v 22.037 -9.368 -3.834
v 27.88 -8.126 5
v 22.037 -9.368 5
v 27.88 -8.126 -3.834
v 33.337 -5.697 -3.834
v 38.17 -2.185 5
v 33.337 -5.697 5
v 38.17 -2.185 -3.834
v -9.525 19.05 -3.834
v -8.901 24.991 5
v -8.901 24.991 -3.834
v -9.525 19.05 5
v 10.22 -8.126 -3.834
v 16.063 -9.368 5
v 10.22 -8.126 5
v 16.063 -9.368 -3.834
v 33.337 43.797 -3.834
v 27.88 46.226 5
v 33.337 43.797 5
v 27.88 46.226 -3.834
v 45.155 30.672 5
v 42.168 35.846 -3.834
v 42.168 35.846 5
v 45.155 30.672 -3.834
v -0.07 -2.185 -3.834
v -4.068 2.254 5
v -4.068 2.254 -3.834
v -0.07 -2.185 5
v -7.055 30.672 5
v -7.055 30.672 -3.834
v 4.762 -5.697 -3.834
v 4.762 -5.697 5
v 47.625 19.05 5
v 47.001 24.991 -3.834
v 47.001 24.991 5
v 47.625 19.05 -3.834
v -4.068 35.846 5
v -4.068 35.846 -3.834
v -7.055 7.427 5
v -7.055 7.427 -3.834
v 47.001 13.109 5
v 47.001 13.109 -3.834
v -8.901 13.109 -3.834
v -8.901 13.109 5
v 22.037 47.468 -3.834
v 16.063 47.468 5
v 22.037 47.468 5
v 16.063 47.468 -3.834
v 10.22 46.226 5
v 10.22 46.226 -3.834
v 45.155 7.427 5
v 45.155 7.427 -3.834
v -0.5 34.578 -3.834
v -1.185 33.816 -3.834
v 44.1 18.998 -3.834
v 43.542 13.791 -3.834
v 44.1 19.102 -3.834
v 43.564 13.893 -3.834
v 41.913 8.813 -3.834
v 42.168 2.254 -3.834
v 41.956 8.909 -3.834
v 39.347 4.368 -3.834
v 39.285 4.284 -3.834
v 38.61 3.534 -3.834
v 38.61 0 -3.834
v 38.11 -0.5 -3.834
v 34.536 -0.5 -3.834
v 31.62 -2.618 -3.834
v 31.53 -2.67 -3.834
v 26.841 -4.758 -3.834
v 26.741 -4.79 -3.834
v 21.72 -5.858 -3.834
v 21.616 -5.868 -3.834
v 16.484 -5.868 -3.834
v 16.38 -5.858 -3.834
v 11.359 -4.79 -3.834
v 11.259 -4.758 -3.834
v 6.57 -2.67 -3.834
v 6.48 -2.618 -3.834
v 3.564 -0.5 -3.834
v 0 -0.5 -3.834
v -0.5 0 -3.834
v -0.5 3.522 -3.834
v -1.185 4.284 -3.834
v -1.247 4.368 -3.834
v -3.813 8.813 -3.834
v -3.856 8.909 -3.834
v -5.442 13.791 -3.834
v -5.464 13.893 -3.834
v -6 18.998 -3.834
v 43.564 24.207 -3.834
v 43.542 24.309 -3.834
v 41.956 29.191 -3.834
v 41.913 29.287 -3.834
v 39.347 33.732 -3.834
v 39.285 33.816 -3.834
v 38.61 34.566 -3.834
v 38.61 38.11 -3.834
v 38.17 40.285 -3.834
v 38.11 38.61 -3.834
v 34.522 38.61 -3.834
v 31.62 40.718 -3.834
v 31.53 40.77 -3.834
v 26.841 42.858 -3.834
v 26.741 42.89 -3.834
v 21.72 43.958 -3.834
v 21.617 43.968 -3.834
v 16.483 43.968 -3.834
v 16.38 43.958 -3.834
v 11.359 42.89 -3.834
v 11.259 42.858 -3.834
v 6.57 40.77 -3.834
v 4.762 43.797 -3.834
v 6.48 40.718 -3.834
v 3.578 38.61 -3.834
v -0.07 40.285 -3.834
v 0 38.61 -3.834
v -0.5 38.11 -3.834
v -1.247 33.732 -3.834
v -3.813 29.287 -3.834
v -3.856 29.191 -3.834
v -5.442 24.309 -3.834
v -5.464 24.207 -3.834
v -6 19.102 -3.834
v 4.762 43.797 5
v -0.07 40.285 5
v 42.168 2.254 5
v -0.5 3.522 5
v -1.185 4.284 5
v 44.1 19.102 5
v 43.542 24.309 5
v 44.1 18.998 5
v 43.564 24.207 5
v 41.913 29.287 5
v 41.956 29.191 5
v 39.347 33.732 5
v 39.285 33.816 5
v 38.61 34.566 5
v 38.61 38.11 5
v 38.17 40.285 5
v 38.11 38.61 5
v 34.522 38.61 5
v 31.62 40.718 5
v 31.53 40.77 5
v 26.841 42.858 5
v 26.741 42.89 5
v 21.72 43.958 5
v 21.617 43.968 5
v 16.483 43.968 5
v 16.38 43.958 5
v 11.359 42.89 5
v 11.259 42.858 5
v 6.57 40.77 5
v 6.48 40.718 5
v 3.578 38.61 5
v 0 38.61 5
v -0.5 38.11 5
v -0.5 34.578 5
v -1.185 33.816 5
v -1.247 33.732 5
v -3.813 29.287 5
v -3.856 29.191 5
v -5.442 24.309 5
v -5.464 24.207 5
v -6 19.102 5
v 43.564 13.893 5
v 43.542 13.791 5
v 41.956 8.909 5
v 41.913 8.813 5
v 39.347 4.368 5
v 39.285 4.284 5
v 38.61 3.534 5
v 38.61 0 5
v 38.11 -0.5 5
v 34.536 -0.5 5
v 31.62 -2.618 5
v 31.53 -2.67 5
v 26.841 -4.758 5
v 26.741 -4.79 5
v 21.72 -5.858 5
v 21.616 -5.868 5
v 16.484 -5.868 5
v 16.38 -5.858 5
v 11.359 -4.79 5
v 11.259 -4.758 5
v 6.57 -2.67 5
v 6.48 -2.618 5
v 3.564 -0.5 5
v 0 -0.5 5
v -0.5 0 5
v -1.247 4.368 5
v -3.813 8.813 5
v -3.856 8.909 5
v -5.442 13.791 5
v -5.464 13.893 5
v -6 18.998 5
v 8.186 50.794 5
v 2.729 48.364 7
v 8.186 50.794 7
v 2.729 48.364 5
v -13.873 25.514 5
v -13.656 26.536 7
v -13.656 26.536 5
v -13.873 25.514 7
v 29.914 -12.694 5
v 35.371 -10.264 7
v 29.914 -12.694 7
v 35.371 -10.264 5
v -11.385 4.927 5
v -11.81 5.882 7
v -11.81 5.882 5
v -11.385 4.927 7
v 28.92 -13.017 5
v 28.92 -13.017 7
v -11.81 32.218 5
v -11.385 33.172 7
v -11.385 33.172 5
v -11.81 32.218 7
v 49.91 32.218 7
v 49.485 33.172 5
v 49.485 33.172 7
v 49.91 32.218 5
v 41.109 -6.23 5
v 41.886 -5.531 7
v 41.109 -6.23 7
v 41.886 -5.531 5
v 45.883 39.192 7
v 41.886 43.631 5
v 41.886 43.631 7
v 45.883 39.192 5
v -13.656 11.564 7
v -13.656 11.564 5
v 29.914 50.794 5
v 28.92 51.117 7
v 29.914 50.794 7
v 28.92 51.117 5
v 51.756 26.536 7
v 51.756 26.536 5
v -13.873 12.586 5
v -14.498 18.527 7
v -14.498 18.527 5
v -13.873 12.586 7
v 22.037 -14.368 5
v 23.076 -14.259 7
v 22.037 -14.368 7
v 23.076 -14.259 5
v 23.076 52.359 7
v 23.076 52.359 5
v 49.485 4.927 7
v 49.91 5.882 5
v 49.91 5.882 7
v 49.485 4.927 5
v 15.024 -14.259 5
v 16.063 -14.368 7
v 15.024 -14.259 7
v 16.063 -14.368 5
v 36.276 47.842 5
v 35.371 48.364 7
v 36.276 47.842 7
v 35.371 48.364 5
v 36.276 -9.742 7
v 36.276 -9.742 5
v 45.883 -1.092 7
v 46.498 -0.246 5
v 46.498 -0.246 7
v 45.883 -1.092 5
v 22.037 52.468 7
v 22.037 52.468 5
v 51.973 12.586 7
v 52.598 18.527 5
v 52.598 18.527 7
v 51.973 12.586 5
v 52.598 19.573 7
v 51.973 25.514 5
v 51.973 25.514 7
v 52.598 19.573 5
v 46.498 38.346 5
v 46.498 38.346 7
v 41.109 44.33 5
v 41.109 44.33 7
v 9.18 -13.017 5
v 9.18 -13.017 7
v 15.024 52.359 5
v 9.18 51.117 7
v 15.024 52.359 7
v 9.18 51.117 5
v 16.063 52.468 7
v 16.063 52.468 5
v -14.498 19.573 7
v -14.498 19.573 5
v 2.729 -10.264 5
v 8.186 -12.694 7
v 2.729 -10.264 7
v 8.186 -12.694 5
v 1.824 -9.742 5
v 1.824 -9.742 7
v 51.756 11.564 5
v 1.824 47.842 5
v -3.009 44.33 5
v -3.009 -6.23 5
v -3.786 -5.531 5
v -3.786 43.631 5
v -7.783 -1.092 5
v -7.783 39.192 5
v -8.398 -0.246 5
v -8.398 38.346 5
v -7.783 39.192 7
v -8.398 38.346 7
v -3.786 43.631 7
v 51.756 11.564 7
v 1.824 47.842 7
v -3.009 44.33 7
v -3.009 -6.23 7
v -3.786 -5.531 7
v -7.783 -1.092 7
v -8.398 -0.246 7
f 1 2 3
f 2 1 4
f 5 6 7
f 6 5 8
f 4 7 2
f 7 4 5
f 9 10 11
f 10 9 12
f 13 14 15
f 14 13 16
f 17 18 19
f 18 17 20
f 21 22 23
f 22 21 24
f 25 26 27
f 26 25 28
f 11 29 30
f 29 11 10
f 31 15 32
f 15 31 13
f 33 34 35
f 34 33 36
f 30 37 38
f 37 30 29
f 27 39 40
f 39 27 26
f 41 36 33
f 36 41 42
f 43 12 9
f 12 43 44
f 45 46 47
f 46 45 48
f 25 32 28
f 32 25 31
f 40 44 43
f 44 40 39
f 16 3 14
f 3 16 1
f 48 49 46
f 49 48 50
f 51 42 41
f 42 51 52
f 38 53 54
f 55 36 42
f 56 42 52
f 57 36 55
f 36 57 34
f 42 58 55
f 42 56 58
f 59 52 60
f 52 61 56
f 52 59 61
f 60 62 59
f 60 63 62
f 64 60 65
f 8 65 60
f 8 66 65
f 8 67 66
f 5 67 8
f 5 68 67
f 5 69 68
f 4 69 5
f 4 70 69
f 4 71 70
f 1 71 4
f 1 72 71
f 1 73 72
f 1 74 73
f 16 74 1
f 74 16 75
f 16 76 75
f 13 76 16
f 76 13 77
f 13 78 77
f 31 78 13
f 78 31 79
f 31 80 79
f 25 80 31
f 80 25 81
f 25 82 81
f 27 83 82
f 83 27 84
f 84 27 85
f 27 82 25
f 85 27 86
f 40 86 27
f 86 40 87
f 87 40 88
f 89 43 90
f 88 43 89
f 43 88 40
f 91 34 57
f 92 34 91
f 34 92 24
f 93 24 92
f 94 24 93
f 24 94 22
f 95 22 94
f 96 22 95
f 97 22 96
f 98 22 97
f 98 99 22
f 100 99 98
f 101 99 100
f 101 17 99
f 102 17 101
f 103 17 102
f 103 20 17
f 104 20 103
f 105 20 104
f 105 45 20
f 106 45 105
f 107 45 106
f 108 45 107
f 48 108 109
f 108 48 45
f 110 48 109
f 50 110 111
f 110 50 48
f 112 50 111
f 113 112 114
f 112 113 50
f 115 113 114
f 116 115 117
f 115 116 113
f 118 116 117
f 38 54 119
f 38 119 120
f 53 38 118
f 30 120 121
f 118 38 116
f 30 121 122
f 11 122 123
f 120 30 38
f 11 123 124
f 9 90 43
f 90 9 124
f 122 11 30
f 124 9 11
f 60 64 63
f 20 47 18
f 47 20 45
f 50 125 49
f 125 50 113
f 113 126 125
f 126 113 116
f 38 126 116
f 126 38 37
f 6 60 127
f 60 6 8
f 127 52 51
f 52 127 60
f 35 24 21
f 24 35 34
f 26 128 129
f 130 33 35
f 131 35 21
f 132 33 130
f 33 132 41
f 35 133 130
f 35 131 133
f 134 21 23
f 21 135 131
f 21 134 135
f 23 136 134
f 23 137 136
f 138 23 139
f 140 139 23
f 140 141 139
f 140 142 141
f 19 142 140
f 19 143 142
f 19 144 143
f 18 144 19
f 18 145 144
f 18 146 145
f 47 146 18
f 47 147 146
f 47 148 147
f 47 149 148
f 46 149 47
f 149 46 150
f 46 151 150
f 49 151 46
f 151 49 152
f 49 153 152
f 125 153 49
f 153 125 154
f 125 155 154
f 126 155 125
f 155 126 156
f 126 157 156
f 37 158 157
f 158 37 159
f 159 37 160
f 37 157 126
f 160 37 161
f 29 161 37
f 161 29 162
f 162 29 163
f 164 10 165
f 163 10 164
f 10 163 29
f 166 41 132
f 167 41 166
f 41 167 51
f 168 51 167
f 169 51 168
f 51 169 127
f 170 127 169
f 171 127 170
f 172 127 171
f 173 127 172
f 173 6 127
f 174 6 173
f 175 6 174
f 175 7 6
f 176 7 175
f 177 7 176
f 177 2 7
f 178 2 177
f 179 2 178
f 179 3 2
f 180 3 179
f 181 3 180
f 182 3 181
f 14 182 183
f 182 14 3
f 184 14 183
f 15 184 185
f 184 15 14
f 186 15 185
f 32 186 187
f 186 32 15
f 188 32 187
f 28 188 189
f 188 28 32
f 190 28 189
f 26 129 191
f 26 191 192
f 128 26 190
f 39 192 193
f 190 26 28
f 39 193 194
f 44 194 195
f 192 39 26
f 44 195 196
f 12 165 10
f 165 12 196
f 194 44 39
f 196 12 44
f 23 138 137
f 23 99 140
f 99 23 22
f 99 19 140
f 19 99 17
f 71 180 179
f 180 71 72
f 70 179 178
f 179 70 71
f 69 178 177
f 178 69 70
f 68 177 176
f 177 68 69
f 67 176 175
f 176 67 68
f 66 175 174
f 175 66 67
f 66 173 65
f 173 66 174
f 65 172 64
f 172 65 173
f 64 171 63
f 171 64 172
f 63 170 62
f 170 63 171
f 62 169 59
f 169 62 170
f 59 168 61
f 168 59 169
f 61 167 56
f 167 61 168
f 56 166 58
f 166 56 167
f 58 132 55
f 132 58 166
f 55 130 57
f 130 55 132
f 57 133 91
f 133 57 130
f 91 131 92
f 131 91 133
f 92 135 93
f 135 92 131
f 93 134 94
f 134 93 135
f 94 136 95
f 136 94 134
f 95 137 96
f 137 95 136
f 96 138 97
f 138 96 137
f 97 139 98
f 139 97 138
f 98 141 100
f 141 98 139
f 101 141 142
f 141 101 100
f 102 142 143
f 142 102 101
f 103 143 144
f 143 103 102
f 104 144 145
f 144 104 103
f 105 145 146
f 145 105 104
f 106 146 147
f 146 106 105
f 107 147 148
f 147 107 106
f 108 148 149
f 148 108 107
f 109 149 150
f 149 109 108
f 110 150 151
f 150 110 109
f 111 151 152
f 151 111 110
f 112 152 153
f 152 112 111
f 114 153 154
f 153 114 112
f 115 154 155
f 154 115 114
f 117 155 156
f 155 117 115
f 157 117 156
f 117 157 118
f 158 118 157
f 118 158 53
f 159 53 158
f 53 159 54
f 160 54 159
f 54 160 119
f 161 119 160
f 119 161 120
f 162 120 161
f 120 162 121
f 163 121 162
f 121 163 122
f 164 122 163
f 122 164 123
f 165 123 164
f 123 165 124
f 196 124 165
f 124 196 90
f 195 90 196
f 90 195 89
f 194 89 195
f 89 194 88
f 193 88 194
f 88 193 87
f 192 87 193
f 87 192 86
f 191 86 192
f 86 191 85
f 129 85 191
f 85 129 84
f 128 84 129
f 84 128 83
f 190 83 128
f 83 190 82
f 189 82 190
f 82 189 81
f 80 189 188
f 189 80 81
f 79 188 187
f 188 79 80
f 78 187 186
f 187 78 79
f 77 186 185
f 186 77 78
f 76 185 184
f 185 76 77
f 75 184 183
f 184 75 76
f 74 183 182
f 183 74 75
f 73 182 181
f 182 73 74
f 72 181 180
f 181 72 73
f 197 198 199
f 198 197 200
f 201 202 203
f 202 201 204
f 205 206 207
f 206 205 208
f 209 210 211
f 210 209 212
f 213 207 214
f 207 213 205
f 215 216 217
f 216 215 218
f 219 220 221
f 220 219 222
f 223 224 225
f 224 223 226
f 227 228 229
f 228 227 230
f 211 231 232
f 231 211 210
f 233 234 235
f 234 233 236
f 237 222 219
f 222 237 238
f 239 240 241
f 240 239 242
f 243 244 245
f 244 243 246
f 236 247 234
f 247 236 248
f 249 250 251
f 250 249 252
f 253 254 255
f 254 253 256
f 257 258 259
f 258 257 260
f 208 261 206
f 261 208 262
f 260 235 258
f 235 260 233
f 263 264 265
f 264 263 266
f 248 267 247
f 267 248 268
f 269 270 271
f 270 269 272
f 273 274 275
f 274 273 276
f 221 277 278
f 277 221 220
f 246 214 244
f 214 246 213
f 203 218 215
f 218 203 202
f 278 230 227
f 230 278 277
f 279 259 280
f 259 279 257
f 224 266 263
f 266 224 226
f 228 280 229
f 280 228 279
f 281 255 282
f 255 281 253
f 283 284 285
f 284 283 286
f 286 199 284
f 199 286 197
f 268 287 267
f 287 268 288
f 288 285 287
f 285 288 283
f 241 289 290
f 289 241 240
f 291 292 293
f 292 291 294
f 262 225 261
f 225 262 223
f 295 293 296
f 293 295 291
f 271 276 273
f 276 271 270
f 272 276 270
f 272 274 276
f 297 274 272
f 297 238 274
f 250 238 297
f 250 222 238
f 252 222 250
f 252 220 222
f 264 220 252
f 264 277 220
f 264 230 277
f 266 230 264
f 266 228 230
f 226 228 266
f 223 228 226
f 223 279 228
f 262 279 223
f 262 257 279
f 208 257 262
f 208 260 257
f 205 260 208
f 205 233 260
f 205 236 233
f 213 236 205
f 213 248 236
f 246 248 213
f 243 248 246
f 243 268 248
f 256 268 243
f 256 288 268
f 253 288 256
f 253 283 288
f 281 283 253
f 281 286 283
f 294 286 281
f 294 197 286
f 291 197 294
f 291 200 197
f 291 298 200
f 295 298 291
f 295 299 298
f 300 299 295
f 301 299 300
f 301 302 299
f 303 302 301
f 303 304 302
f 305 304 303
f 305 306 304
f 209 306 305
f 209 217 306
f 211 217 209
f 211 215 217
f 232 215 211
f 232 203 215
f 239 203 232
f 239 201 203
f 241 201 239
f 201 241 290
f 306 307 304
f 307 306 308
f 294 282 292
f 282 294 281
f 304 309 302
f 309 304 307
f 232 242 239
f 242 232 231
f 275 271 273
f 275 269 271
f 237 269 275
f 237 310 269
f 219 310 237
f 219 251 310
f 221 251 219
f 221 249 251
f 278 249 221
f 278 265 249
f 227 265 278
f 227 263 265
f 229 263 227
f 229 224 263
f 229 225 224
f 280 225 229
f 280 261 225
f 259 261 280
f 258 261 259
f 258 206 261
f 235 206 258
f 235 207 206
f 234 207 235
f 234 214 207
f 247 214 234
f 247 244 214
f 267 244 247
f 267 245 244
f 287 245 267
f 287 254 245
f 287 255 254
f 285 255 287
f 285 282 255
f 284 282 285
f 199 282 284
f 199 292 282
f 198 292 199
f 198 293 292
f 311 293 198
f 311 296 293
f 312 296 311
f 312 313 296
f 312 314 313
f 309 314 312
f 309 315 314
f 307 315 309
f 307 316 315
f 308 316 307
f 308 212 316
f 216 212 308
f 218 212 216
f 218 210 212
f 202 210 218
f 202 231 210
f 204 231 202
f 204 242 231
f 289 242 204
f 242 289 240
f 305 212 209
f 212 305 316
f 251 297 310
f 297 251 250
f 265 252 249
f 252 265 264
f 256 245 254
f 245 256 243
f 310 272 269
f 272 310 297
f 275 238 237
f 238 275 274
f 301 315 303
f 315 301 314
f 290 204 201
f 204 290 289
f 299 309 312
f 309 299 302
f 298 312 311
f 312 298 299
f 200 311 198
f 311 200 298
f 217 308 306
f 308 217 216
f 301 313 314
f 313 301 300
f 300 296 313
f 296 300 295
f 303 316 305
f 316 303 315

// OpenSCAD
// file: ../../lib/circuits/helpers.scad
function bu(u) = u * 2.54;

module breadboard_row(number, orientation="vertical") {
  children();
  if(number > 1) {
    if(orientation == "vertical") {
      translate([0,bu(1),0])
        breadboard_row(number-1, orientation=orientation) {
          children();
        }
    } else {
      translate([bu(1),0,0])
        breadboard_row(number-1, orientation=orientation){
          children();
        }
    }
  }
}
// file: ../../lib/switches/rgb.scad
include <../variables.scad>

module rgb_row_trace_connection(width, height, xpos, ypos, rgb, connections) {
  half_width = u_mm(width)/2;
  half_height = u_mm(height)/2;
  if(connections[3] == "connect") {
    translate([1-half_width,8.875,0]){
      circle(d=0.8,$fn=40);
      offset(0.4)
        polygon(points=[[0,-0.01],[0,0.01],[u_mm(-xpos)-2, u_mm(-ypos)+0.01],[u_mm(-xpos)-2, u_mm(-ypos)-0.01]]);
    }
    translate([1-half_width,4.9,0]){
      circle(d=0.8,$fn=40);
      offset(0.4)
        polygon(points=[[0,-0.01],[0,0.01],[u_mm(-xpos)-2, u_mm(-ypos)+0.01],[u_mm(-xpos)-2, u_mm(-ypos)-0.01]]);
    }
    translate([1-half_width,3.3,0]){
      circle(d=0.8,$fn=40);
      offset(0.4)
        polygon(points=[[0,-0.01],[0,0.01],[u_mm(-xpos)-2, u_mm(-ypos)+0.01],[u_mm(-xpos)-2, u_mm(-ypos)-0.01]]);
    }
  }
  if(connections[2] == "connect") {
    translate([half_width-1,8.875,0]) {
      circle(d=0.8,$fn=40);
    }
    translate([half_width-1,4.9,0]) {
      circle(d=0.8,$fn=40);
    }
    translate([half_width-1,3.3,0]){
      circle(d=0.8,$fn=40);
    }
  }
}

module rgb_pcb_drill(width=1, height=1, rgb=true, connections=["hole","hole","hole","hole"]) {
  half_width = u_mm(width)/2;
  half_height = u_mm(height)/2;
  translate([half_width,half_height,0]) {
    if(rgb == true) {
      // LED Hole
      translate([-1.875,3.4])
        square([3.75,3]);

      // LED D
      if(connections[3] == "hole")
        translate([1.3-half_width,8,0])
          circle(d=1,$fn=40);
      if(connections[2] == "hole")
        translate([half_width-1.3,8,0])
          circle(d=1,$fn=40);

      // LED G
      if(connections[3] == "hole")
        translate([1.3-half_width,5.4,0])
          circle(d=1,$fn=40);
      if(connections[2] == "hole")
        translate([half_width-1.3,5.4,0])
          circle(d=1,$fn=40);

      // LED V
      if(connections[3] == "hole")
        translate([1.3-half_width,2.8,0])
          circle(d=1,$fn=40);
      if(connections[2] == "hole")
        translate([half_width-1.3,2.8,0])
          circle(d=1,$fn=40);
    }

    children();
  }
}

module rgb_pcb_hole_traces(width=1, height=1, rgb=true, xpos=0, ypos=0, connections=["hole","hole","hole","hole"]) {
  half_width = u_mm(width)/2;
  half_height = u_mm(height)/2;
  translate([half_width,half_height,0]) {
    if(rgb == true) {
      // LED D
      if(connections[3] == "hole")
        translate([1.3-half_width,8,0])
          circle(d=2.5,$fn=40);
      if(connections[2] == "hole")
        translate([half_width-1.3,8,0])
          circle(d=2.5,$fn=40);

      // LED G
      if(connections[3] == "hole")
        translate([1.3-half_width,5.4,0])
          circle(d=2.5,$fn=40);
      if(connections[2] == "hole")
        translate([half_width-1.3,5.4,0])
          circle(d=2.5,$fn=40);

      // LED V
      if(connections[3] == "hole")
        translate([1.3-half_width,2.8,0])
          circle(d=2.5,$fn=40);
      if(connections[2] == "hole")
        translate([half_width-1.3,2.8,0])
          circle(d=2.5,$fn=40);
    }

    children();
  }
}

module rgb_pcb_traces(width=1, height=1, rgb=true, xpos=0, ypos=0, connections=["hole","hole","hole","hole"]) {
  half_width = u_mm(width)/2;
  half_height = u_mm(height)/2;
  rgb_pcb_hole_traces(width=width, height=height, rgb=rgb, connections=connections) {
    if(rgb == true) {
      rgb_row_trace_connection(width=width, height=height, xpos=xpos, ypos=ypos, rgb=rgb, connections=connections);
      v_left = connections[3] == "none" ? 1 : half_width-5;
      // LED G
      translate([1.25,5])
        square([2,2]);
      translate([2.7,8.5,0]) {
        length = connections[2] == "none" ? 2 : half_width-3.7; 
        square([length,0.75]);
      }
      translate([2.7,6.8])
        square([0.8,2.4]);
      translate([-3.5,6.2])
        square([7,0.8]);
      translate([-3.5,6.8])
        square([0.8,2.4]);
      translate([-4-v_left,8.5,0])
        square([v_left+1,0.75]);

      // LED D
      translate([-4-v_left,4.5,0])
        square([v_left,0.8]);
      translate([-4.5,4.5,0])
        square([0.8,1.3]);
      translate([-4.5,5,0])
        square([1.3,0.8]);
      translate([2,4,0])
        square([2,0.8]);
      translate([4,4,0])
        square([0.8,1.3]);
      translate([4,4.5,0]) {
        length = connections[2] == "none" ? 0 : half_width-5; 
        square([length,0.75]);
      }
      translate([-3.375,5])
        square([2,1.1]);
      translate([1.25,3.75])
        square([2,1.1]);

      // LED V
      v_right = connections[2] == "none" ? 0 : half_width-5.25;
      translate([-4-v_left,2.9,0])
        square([v_right+v_left+8.875,0.8]);
      translate([-3.375,3.5])
        square([2,1.35]);
    }

    children();
  }
}
// file: ../../lib/switches/base.scad
include <../variables.scad>
include <rgb.scad>

// ["top", "bottom", "left", "right"]

module switch_row_trace_connection(width, height, xpos, ypos, rgb, connections) {
  half_width = u_mm(width)/2;
  half_height = u_mm(height)/2;
  if(connections[3] == "connect") {
    translate([1-half_width,-5.5,0]){
      circle(d=0.8,$fn=40);
      offset(0.4)
        polygon(points=[[0,-0.01],[0,0.01],[u_mm(-xpos)-2, u_mm(-ypos)+0.01],[u_mm(-xpos)-2, u_mm(-ypos)-0.01]]);
    }
  }
  if(connections[2] == "connect") {
    translate([half_width-1,-5.5,0]) {
      circle(d=0.8,$fn=40);
    }
  }
}

module switch_column_trace_connection(width, height, xpos, ypos, rgb, connections, last_xpos=0, last_ypos=0) {
  half_width = u_mm(width)/2;
  half_height = u_mm(height)/2;
  if(connections[1] == "connect") {
    translate([-u_mm((width-1)/2)-0.9,half_height-1,0]) {
      circle(d=0.8,$fn=40);
      offset(0.4)
        polygon(points=[[0,-0.01],[0,0.01],[u_mm((width-1)/2),0.01],[u_mm((width-1)/2),-0.01]]);
    }
  }
  if(connections[0] == "connect") {
    y_off = u_mm(ypos-last_ypos);
    x_off = u_mm(last_xpos-xpos);
    translate([-0.875,-1-y_off-half_height,0]) {
      offset(0.4)
        polygon(points=[[-0.01+x_off,0],[0.01+x_off,0],[0.01,2+y_off],[-0.01,2+y_off]]);
      translate([x_off-0.01,0]) {
        offset(0.4)
          polygon(points=[[0,-0.01],[0,0.01],[u_mm((width-1)/2)+1,0.01],[u_mm((width-1)/2)+1,-0.01]]);
      }
    }
  }
}

module switch_base_pcb_drill(width=1, height=1, rgb=true, single=true, connections=["hole","hole","hole","hole"]) {
  half_width = u_mm(width)/2;
  half_height = u_mm(height)/2;
  rgb_pcb_drill(width=width, height=height, rgb=rgb, connections=connections) {
    // Row
    if(connections[2] == "hole")
      translate([half_width-1.3,-5.5,0])
        circle(d=1,$fn=40);
    if(connections[3] == "hole")
      translate([1.3-half_width,-5.5,0])
        circle(d=1,$fn=40);

    // Column
    if(connections[1] == "hole")
      translate([-1,half_height-1.25,0])
        circle(d=1,$fn=40);
    if(connections[0] == "hole")
      translate([-1,1.25-half_height,0])
        circle(d=1,$fn=40);

    children();
  }
}

module switch_base_pcb_traces(width=1, height=1, rgb=true, xpos=0, ypos=0, connections=["hole","hole","hole","hole"], last_xpos=0, last_ypos=0, single=true) {
  half_width = u_mm(width)/2;
  half_height = u_mm(height)/2;
  rgb_pcb_traces(width=width, height=height, rgb=rgb, xpos=xpos, ypos=ypos, connections=connections) {
    switch_row_trace_connection(width, height, xpos, ypos, rgb, connections);
    if(single && !rgb)
      switch_column_trace_connection(width, height, xpos, ypos, rgb, connections, last_xpos=last_xpos, last_ypos=last_ypos);

    // Row
    if(connections[2] == "hole")
      translate([half_width-1.3,-5.5,0])
        circle(d=2.5,$fn=40);
    if(connections[3] == "hole")
      translate([1.3-half_width,-5.5,0])
        circle(d=2.5,$fn=40);

    // Column
    if(connections[1] == "hole")
      translate([-1,half_height-1.25,0])
        circle(d=2.4,$fn=40);
    if(connections[0] == "hole")
      translate([-1,1.25-half_height,0])
        circle(d=2.4,$fn=40);

    children();
  }
}

module switch_base_pcb_traces_bottom(width=1, height=1, rgb=true, xpos=0, ypos=0, connections=["hole","hole","hole","hole"], last_xpos=0, last_ypos=0) {
  half_width = u_mm(width)/2;
  half_height = u_mm(height)/2;
  rgb_pcb_hole_traces(width=width, height=height, rgb=rgb, connections=connections) {
    switch_column_trace_connection(width, height, xpos, ypos, rgb, connections, last_xpos=last_xpos, last_ypos=last_ypos);

    // Row
    if(connections[2] == "hole")
      translate([half_width-1.3,-5.5,0])
        circle(d=2.5,$fn=40);
    if(connections[3] == "hole")
      translate([1.3-half_width,-5.5,0])
        circle(d=2.5,$fn=40);

    // Column
    if(connections[1] == "hole")
      translate([-1,half_height-1.25,0])
        circle(d=2.5,$fn=40);
    if(connections[0] == "hole")
      translate([-1,1.25-half_height,0])
        circle(d=2.5,$fn=40);

    children();
  }
}
// file: ../../lib/switches/footprints.scad
include <../variables.scad>
include <stabilizers.scad>

module pcb_switch_outline(width=1, height=1) {
  stab_extra = width >= 2 ? 2 : 0;
  translate([0,-stab_extra])
    square([u_mm(width)+0.01, u_mm(height)+0.01+stab_extra]);
}

module pcb_switch_space_outline(width=1, height=1, style="mx", cnc=false) {
  offset = height_for_style(style);
  stab_extra = width >= 2 ? 2 : 0;
  translate([-1,-1-stab_extra,2.834-offset])
    cube([u_mm(width) + 2, u_mm(height) + 2 + stab_extra, 1.166+offset]);
  translate([u_mm(width/2),u_mm(height/2)]) {
    translate([-7.5,-7.5,1.5-offset])
      cube([15,15,5]);
    translate([-7,-7,-10])
      cube([14,14,10]);
    translate([u_mm(-width/2)-0.5,u_mm(-height/2)-0.5,-20-offset])
      cube([u_mm(width)+1,u_mm(height)+1, 20]);
  }
  translate([hole_offset(width), hole_offset(height),-10])
    stab(width);
}
// file: ../../lib/switches/stabilizers.scad
module stab_hole_render(distance){
  translate([14+distance+3.375,6.99,0]) {
    circle(d=3.175, $fn=40);
    translate([0,-15.24,0])
      circle(d=4.064, $fn=40);
  }
  translate([-6.75-distance+3.375,6.99,0]) {
    circle(d=3.175, $fn=40);
    translate([0,-15.24,0])
      circle(d=4.064, $fn=40);
  }
}

module stab_holes(width) {
  if (width >= 7) {
    stab_hole_render(39.6);
  } else if (width >= 6) {
    stab_hole_render(39.6);
  } else if(width >= 2) {
    stab_hole_render(1.6);
  }
}

module stab_render(distance, cnc=false, height=5.334) {
  translate([14+distance,1.47,0]){
    // Right Side Large Hole
    cube([6.75,12.3,10]);

    // Add 1/16" corner holes for milling
    if(cnc){
      translate([0.56,0.56,0])
        cylinder(h=10,d=1.59,$fn=20);
      translate([6.75-0.56,0.56,0])
        cylinder(h=10,d=1.59,$fn=20);
      translate([0.56,12.3-0.56,0])
        cylinder(h=10,d=1.59,$fn=20);
      translate([6.75-0.56,12.3-0.56,0])
        cylinder(h=10,d=1.59,$fn=20);
    }
    translate([5.75,3.23,0]){
      // Side hole for notch
      cube([1.825,3.175,10]);
      translate([1.825,1.59,0])
        if(cnc)
          resize([1.59,3.175,10])
            cylinder(h=10,d=1.59,$fn=20);
    }
    translate([1.725,11.3,0]){
      // Top Notch
      cube([3.3,2.2,10]);
      if(cnc)
        translate([1.65,2.2,0])
          resize([3.3,1,10])
            cylinder(h=10,d=1,$fn=20);
    }
    // Thin out for clip
    translate([-1,-1,10-height+1.5])
      cube([8.75,14.3,height-1.5]);
  }
  translate([-6.75-distance,1.47,0]){
    // Left Side Large Hole
    cube([6.75,12.3,10]);
    translate([-0.825,3.23,0]){
      // Side hole for notch
      cube([1.825,3.175,10]);
      if(cnc)
        translate([0,1.59,0])
          resize([1.59,3.175,10])
            cylinder(h=10,d=1.59,$fn=20);

    }
    translate([1.725,11.3,0]){
      // Top Notch
      cube([3.3,2.2,10]);
      if(cnc)
        translate([1.65,2.2,0])
          resize([3.3,1,10])
            cylinder(h=10,d=1,$fn=20);
    }
    if(cnc){
      translate([0.56,0.56,0])
        cylinder(h=10,d=1.59,$fn=20);
      translate([6.75-0.56,0.56,0])
        cylinder(h=10,d=1.59,$fn=20);
      translate([0.56,12.3-0.56,0])
        cylinder(h=10,d=1.59,$fn=20);
      translate([6.75-0.56,12.3-0.56,0])
        cylinder(h=10,d=1.59,$fn=20);
    }
    // Thin out for clip
    translate([-1,-1,10-height+1.5])
      cube([8.75,14.3,height-1.5]);
  }
  // Center shaft for bar
  translate([-distance-2,4.7,0]){
    cube([distance*2+20,4.6,10]);
  }
}

module stab(key_width, cnc=false) {
  if (key_width >= 7) {
    stab_render(39.6, cnc=cnc);
  } else if (key_width >= 6) {
    stab_render(39.6, cnc=cnc);
  } else if(key_width >= 2) {
    stab_render(1.6, cnc=cnc);
  }
}
// file: ../../lib/circuits/wire.scad
module guage(guage=12) {
  fn=20;
  if(guage == 8) {
    circle(d=3.25, $fn=fn);
  } else if (guage == 10) {
    circle(d=2.59, $fn=fn);
  } else if (guage == 12) {
    circle(d=2.06, $fn=fn);
  } else if (guage == 14) {
    circle(d=1.57, $fn=fn);
  } else if (guage == 16) {
    circle(d=1.3, $fn=fn);
  }
}

module wire_pcb_drill(guage=12) {
  offset(0.1)
    guage(guage);
}

module wire_pcb_traces(guage=12) {
  offset(0.75)
    guage(guage);
}

module wire_pcb_outline(guage=12) {
  offset(1.5)
    guage(guage);
}

module wire_space_outline(guage=12) {
  linear_extrude(10)
    offset(0.1)
      guage(guage);
}
// file: ../../lib/circuits/trrs.scad
module trrs_post(d=1.2) {
  translate([0,-d/4,0]) {
    circle(d=d, $fn=20);
    translate([-d/2,0,0]) {
      square([d,(d/2-.2)]);
    }
    translate([0,(d/2-.2),0]) {
      circle(d=d, $fn=20);
    }
  }
}

module trrs_pcb_drill(side="left") {
  translate([2.8,1.5]) {
    circle(d=2, $fn=20);
  }
  translate([2.8,8.5]) {
    circle(d=2, $fn=20);
  }
  translate([0.5,11.3,0]) {
    trrs_post();
  }
  translate([5.1,3.2,0]) {
    trrs_post();
  }
  translate([5.1,6.2,0]) {
    trrs_post();
  }
  translate([5.1,10.2,0]) {
    trrs_post();
  }
  if(side != "none"){
    offset = side == "left" ? 7.6 : -2;
    translate([offset,11.3]) {
      circle(d=1.2, $fn=20);
    }
    translate([offset,8.3]) {
      circle(d=1.2, $fn=20);
    }
    translate([offset,5.3]) {
      circle(d=1.2, $fn=20);
    }
    translate([offset,2.2]) {
      circle(d=1.2, $fn=20);
    }
  }
}

module trrs_pcb_traces(side="left") {
  translate([-1,9.7,0]){
    difference() {
      square([3,3]);
      if(side == "right") {
        translate([3,-1.8]) {
          rotate(45) {
            square(2);
          }
        }
      }
    }
  }
  translate([3.6,1.2,0]){
    difference() {
      square([3,3.5]);
      if(side == "left") {
        translate([3,2.3]) {
          rotate(45) {
            square(2);
          }
        }
      }
    }
  }
  translate([3.6,4.8,0]){
    difference() {
        square([3,3.5]);
        if(side == "left") {
          translate([3,2.3]) {
            rotate(45) {
              square(2);
            }
          }
        }
    }
  }
  translate([3.6,8.4,0]){
    difference() {
      square([3,3.2]);
      if(side == "left") {
        translate([3,1.8]) {
          rotate(45) {
            square(2);
          }
        }
      }
    }
  }
  if(side != "none"){
    translate([side == "left" ? 7.6 : -2,0,0]){
      translate([0,11.3]) {
        circle(d=3, $fn=20);
      }
      translate([0,8.3]) {
        circle(d=2.9, $fn=20);
      }
      translate([0,5.3]) {
        circle(d=3, $fn=20);
      }
      translate([0,2.2]) {
        circle(d=3, $fn=20);
      }
    }
    translate([side == "left" ? 5.6 : -2,0,0]){
      left_trace = side == "left" ? 2.5 : 7.6;
      translate([0,2.2]) {
        square([left_trace,1.5]);
      }
      translate([0,5.1]) {
        square([left_trace,1.5]);
      }
      if(side == "left") {
        translate([0,8.7]) {
          square([left_trace,0.9]);
        }
      }
      else {
        translate([0,8]) {
          square([4,1.6]);
        }
        translate([4,9]) {
          square([4,1.6]);
        }
        translate([2.8,9.4]) {
          rotate(-45) {
            square([1,1.7]);
          }
        }
      }
    }
    translate([side == "left" ? 0.5 : -2,0,0]){
      right_trace = side == "left" ? 7.1 : 2;
      translate([0,11.7]) {
        square([right_trace,1.3]);
      }
      translate([0,12]) {
        circle(1, $fn=20);
      }
      translate([right_trace,11.8]) {
        circle(1, $fn=20);
      }
    }
  }
}

module trrs_pcb_outline(side="left") {
  translate([-1,0,0]) {
    square([7.6,13.1]);
  }
  if(side != "none"){
    translate([side == "left" ? 5.6 : -3.5, 0]) {
      square([4,13.1]);
    }
  }
}

module trrs_space_outline(side="left") {
  translate([0,0,-5.3]) {
    linear_extrude(7){
      translate([-2,-1,0])
        square([9.6,15.1]);
      translate([0,-12.1,0])
        square([5.6,12.1]);
      if(side != "none")
        translate([side == "left" ? 5.6 : -4.5, -1])
          square([5,15.1]);
    }
  }
  translate([3,-2,-2.6]) {
    rotate([90,0,0]) {
      cylinder(d=10, h=30, $fn=100);
    }
  }
}
// file: ../../lib/circuits/trace.scad
function vdef(vector, index) = len(vector) == index ? vector[index-1] : vector[index];
function vadd(vector, index, axis) = vdef(vector, index)[axis] > vdef(vector, index-1)[axis] ? 0.01 : -0.01;
function polygon_from_vector(vector) = 
  len(vector) > 0 ?
    concat(vector, 
      [for (i = [1:len(vector)]) 
        [vector[len(vector)-i][0]-vadd(vector, i, 0),vector[len(vector)-i][1]-vadd(vector, i, 1)]])
      : [];

function parse_loc(loc) = [
  loc[5],
  len(loc) < 7 ? "both" : loc[6],
  len(loc) < 8 ? "none" : loc[7],
];

module manual_trace_pcb_drill(location) {
  vector = parse_loc(location)[0];
  echo("holes", parse_loc(location)[2]);
  if(parse_loc(location)[2] == "holes" || parse_loc(location)[2] == "hole_begin") {
    translate(vector[0]) {
      circle(d=1, $fn=20);
    }
  }
  if(parse_loc(location)[2] == "holes" || parse_loc(location)[2] == "hole_end") {
    translate(vector[len(vector)-1]) {
      circle(d=1, $fn=20);
    }
  }
}

module manual_trace_pcb_traces(location) {
  vector = parse_loc(location)[0];
  if(parse_loc(location)[1] != "bottom") {
    offset(0.4) {
      polygon(points=polygon_from_vector(vector));
    }
  }
  if(parse_loc(location)[2] == "holes" || parse_loc(location)[2] == "hole_begin") {
    translate(vector[0]) {
      circle(d=2.5, $fn=20);
    }
  }
  if(parse_loc(location)[2] == "holes" || parse_loc(location)[2] == "hole_end") {
    translate(vector[len(vector)-1]) {
      circle(d=2.5, $fn=20);
    }
  }
}

module manual_trace_pcb_traces_bottom(location) {
  vector = parse_loc(location)[0];
  if(parse_loc(location)[1] != "top") {
    offset(0.4) {
      polygon(points=polygon_from_vector(vector));
    }
  }
  if(parse_loc(location)[2] == "holes" || parse_loc(location)[2] == "hole_begin") {
    translate(vector[0]) {
      circle(d=2.5, $fn=20);
    }
  }
  if(parse_loc(location)[2] == "holes" || parse_loc(location)[2] == "hole_end") {
    translate(vector[len(vector)-1]) {
      circle(d=2.5, $fn=20);
    }
  }
}

module manual_trace_pcb_outline(location) {
  vector = parse_loc(location)[0];
  echo("location", location);
  offset(1)
    polygon(points=polygon_from_vector(vector));

  if(parse_loc(location)[2] == "holes" || parse_loc(location)[2] == "hole_begin") {
    translate(vector[0]) {
      circle(d=4, $fn=20);
    }
  }
  if(parse_loc(location)[2] == "holes" || parse_loc(location)[2] == "hole_end") {
    translate(vector[len(vector)-1]) {
      circle(d=4, $fn=20);
    }
  }
}

module manual_trace_space_outline(location) {
  vector = parse_loc(location)[0];
  translate([0,0,-1])
    linear_extrude(2)
      offset(0.5)
        manual_trace_pcb_outline(vector);
}
// file: ../../lib/circuits/support.scad
module support_pcb_drill(mm=2) {
  offset(0.1)
    circle(d=mm, $fn=20);
}

module support_pcb_traces(mm=2) {
}

module support_pcb_outline(mm=2) {
  offset(2)
    circle(d=mm, $fn=20);
}

module support_space_outline(mm=2) {
  linear_extrude(10)
    offset(0.1)
      circle(d=mm, $fn=20);
}
// file: ../../lib/circuits/proton_c.scad
use <helpers.scad>

module proton_c_pcb_drill(size="full") {
  translate([bu(0.5),bu(1.5),0]) {
    translate([0,bu(1)])
      breadboard_row(4, "horizontal"){
        circle(d=1, $fn=20);
        translate([0,bu(1)])
          circle(d=1, $fn=20);
      }
    translate([bu(4),bu(1)])
      breadboard_row(2)
        circle(d=1, $fn=20);
    translate([bu(4),bu(3)])
      breadboard_row(2)
        circle(d=1, $fn=20);
    circle(d=1, $fn=20);
    translate([bu(1),0,0])
      circle(d=1, $fn=20);
    translate([bu(5),0,0])
      circle(d=1, $fn=20);
    translate([bu(6),0,0])
      circle(d=1, $fn=20);
    breadboard_row(12) {
      circle(d=1, $fn=20);
      translate([bu(1),0,0])
        circle(d=1, $fn=20);
      translate([bu(5),0,0])
        circle(d=1, $fn=20);
      translate([bu(6),0,0])
        circle(d=1, $fn=20);
    }
    if(size == "full")
      translate([0,bu(13)])
        breadboard_row(6) {
          circle(d=1, $fn=20);
          translate([bu(1),0,0])
            circle(d=1, $fn=20);
          translate([bu(5),0,0])
            circle(d=1, $fn=20);
          translate([bu(6),0,0])
            circle(d=1, $fn=20);
    }
  }
}

module proton_c_pcb_traces(size="full") {
  translate([bu(0.5),bu(1.5),0]) {
    translate([0,bu(1)])
      breadboard_row(4, "horizontal"){
        circle(d=2.4, $fn=20);
        translate([-1,0])
          square([2,bu(1)]);
        translate([0,bu(1)])
          circle(d=2.4, $fn=20);
      }
    translate([0,bu(1)])
      breadboard_row(2) {
        translate([bu(5),0])
          circle(d=2.4, $fn=20);
        translate([bu(5),-1,0])
          square([bu(1),2]);
        translate([bu(6),0,0])
          circle(d=2.4, $fn=20);
      }
    translate([bu(4),bu(1)]){
      translate([-0.75,-1])
        square([1.5,bu(2)-2]);
      breadboard_row(2)
        circle(d=2.4, $fn=20);
      translate([0,-0.75])
        square([bu(2),1.5]);
    }
    translate([bu(4),bu(3)]){
      translate([-0.75,-1])
        square([1.5,bu(2)-2]);
      breadboard_row(2)
        circle(d=2.4, $fn=20);
      translate([0,-0.75])
        square([bu(2),1.5]);
    }
    circle(d=2.4, $fn=20);
    translate([0,-1,0])
      square([bu(1),2]);
    translate([bu(1),0,0])
      circle(d=2.4, $fn=20);
    translate([bu(5),0])
      circle(d=2.4, $fn=20);
    translate([bu(5),-1,0])
      square([bu(1),2]);
    translate([bu(6),0,0])
      circle(d=2.4, $fn=20);
    translate([0,bu(3)])
      breadboard_row(9) {
        circle(d=2.4, $fn=20);
        translate([0,-1,0])
          square([bu(1),2]);
        translate([bu(1),0,0])
          circle(d=2.4, $fn=20);
        translate([bu(5),0])
          circle(d=2.4, $fn=20);
        translate([bu(5),-1,0])
          square([bu(1),2]);
        translate([bu(6),0,0])
          circle(d=2.4, $fn=20);
      }
    if(size == "full")
      translate([0,bu(13)])
        breadboard_row(6) {
          circle(d=2.4, $fn=20);
          translate([0,-1,0])
            square([bu(1),2]);
          translate([bu(1),0,0])
            circle(d=2.4, $fn=20);
          translate([bu(5),0])
            circle(d=2.4, $fn=20);
          translate([bu(5),-1,0])
            square([bu(1),2]);
          translate([bu(6),0,0])
            circle(d=2.4, $fn=20);
        }
  }
}

module proton_c_pcb_outline(size="full") {
  translate([0,bu(1)])
  square([bu(7), bu(size == "full" ? 19 : 12)]);
}

module proton_c_space_outline(size="full") {
  translate([0,0,-4]) {
    linear_extrude(6) {
      translate([-bu(0.5),-bu(0.5)])
        square([bu(8), bu(size == "full" ? 21 : 14)]);
    }
    linear_extrude(5) {
      translate([bu(0.5),-bu(15),0])
        square([bu(6),bu(25)]);
    }
  }
}
// file: ../../lib/circuits/pro_micro.scad
use <helpers.scad>

module pro_micro_pcb_drill(connections="holes") {
  translate([bu(0.5),bu(1.5),0]) {
    if(connections == "holes"){
      translate([bu(3),bu(1)])
        breadboard_row(3)
          circle(d=1, $fn=20);
      translate([bu(4),bu(3)])
        breadboard_row(3)
          circle(d=1, $fn=20);
    }
    breadboard_row(12) {
      circle(d=1, $fn=20);
      if(connections == "holes") {
        translate([bu(1),0,0])
          circle(d=1, $fn=20);
        translate([bu(5),0,0])
          circle(d=1, $fn=20);
      }
      translate([bu(6),0,0])
        circle(d=1, $fn=20);
    }
  }
}

module pro_micro_pcb_traces(connections="holes") {
  translate([bu(0.5),bu(1.5),0]) {
    // GRND
    if(connections == "holes"){
      translate([bu(3),bu(1)]){
        translate([-0.75,-1])
          square([1.5,bu(3)-2]);
        breadboard_row(3)
          circle(d=2.4, $fn=20);
        translate([0,-0.75])
          square([bu(2),1.5]);
      }
      translate([bu(4),bu(3)]){
        translate([-0.75,-1])
          square([1.5,bu(3)-2]);
        breadboard_row(3)
          circle(d=2.4, $fn=20);
        translate([0,-0.75])
          square([bu(2),1.5]);
      }
    }
    breadboard_row(12) {
      circle(d=2.4, $fn=20);
      if(connections == "holes") {
        translate([0,-1,0])
          square([bu(1),2]);
        translate([bu(1),0,0])
          circle(d=2.4, $fn=20);
        translate([bu(5),0])  
          circle(d=2.4, $fn=20);
        translate([bu(5),-1,0])
          square([bu(1),2]);
      }
      translate([bu(6),0,0])
        circle(d=2.4, $fn=20);
    }
  }
}

module pro_micro_pcb_outline() {
  translate([0,bu(1)])
  square([bu(7), bu(12)]);
}

module pro_micro_space_outline() {
  translate([0,0,-4]) {
    linear_extrude(6) {
      translate([-bu(0.5),-bu(0.5)])
        square([bu(8), bu(14)]);
    }
    linear_extrude(5) {
      translate([bu(0.5),-bu(15),0])
        square([bu(6),bu(25)]);
    }
  }
}
// file: ../../lib/circuits/mts_101.scad
use <../variables.scad>
module mts_101_pcb_drill() {
  translate([0,1.25]) {
    translate([2.5,0])
      square([3,1]);
    translate([1.25,0.5])
      circle(d=1,$fn=40);
    translate([6.75,0.5])
      circle(d=1,$fn=40);

    translate([2.5,4.75])
      square([3,1]);
    translate([1.25,5.25])
      circle(d=1,$fn=40);
    translate([6.75,5.25])
      circle(d=1,$fn=40);

    translate([4,10])
      circle(d=1,$fn=40);
    translate([1.25,10])
      circle(d=1,$fn=40);
    translate([6.75,10])
      circle(d=1,$fn=40);
  }
}

module mts_101_pcb_traces() {
  translate([0,1.25]) {
    translate([2,-0.5])
      square([4,2]);
    translate([1.25,0.5])
      circle(d=2,$fn=40);
    translate([6.75,0.5])
      circle(d=2,$fn=40);

    translate([2,4.25])
      square([4,2]);
    translate([1.25,5.25])
      circle(d=2,$fn=40);
    translate([6.75,5.25])
      circle(d=2,$fn=40);

    translate([4,10])
      circle(d=2,$fn=40);
    translate([1.25,9.5])
      square([6,1]);
    translate([1.25,10])
      circle(d=2,$fn=40);
    translate([6.75,10])
      circle(d=2,$fn=40);
  }
}

module mts_101_pcb_outline() {
  square([8,13]);
}

module mts_101_space_outline(, cnc=false) {
  translate([-0.5,-0.5,-10])
    cube([9,14, 14.4]);
  translate([4,6.5,-26]) {
    cylinder(d=6, h=18, $fn=30);
    cylinder(d=12, h=10, $fn=60);
  }
}
// file: ../../lib/circuits/ec11.scad
use <../variables.scad>
use <../switches/base.scad>

module 1u_centered() {
  translate([u_mm(0.5),u_mm(0.5)])
    children();
}

module ec11_pcb_drill(single=false, connections=["hole","hole","hole","hole"]) {
  switch_base_pcb_drill(rgb=false, connections=connections) {
    // Key Column
    translate([-3,0,0])
      circle(d=1,$fn=40);

    // Key Row
    translate([7,2.5])
      circle(d=1, $fn=20);

    if(single) {
      translate([4.25,-3,0])
        circle(d=1, $fn=20);
      translate([-3,-3.25,0])
        circle(d=1,$fn=40);
    }
    translate([4.25,0,0])
      circle(d=1, $fn=20);

    translate([7,-2.5])
      circle(d=1, $fn=20);

    if(connections[3] == "hole"){
      translate([-5.5,2.5])
        circle(d=1, $fn=20);
      translate([-5.5,0])
        circle(d=1, $fn=20);
      translate([-5.5,-2.5])
        circle(d=1, $fn=20);
    }
    translate([-7.5,-2.5])
      circle(d=1, $fn=20);
    translate([-7.5,2.5])
      circle(d=1, $fn=20);
    translate([-7.5,0])
      circle(d=1, $fn=20);

    translate([-1.3,-6.25])
      square([2.6,1.5]);
    translate([-1.3,4.75])
      square([2.6,1.5]);
  }
}

module ec11_pcb_traces(single=false, connections=["hole","hole","hole","hole"]) {
  switch_base_pcb_traces(single=single, rgb=false, connections=connections) {
    // Key Row
    if(single){
      translate([2,2.2])
        square([4.5,0.8]);
      r_len = connections[0] != "none" ? u_mm(0.5)-1 : 6;
      l_len = connections[1] != "none" ? u_mm(0.5)-1 : 6;
      translate([2,-r_len])
        square([0.8,r_len+l_len]);
      if(connections[0] != "none")
        translate([-2,1-u_mm(0.5)])
          square([4,0.8]);
      if(connections[1] != "none")
        translate([-2.1,u_mm(0.5)-1.6])
          square([4.9,0.8]);
    }
    translate([7,2.5])
      circle(d=2.5,$fn=40);

    // Key Column
    if(connections[3] != "none")
      translate([1-u_mm(0.5),-6])
        square([u_mm(0.5)-4,1]);
    translate([-3.25,-6])
      square([0.8,5]);
    translate([-3,0])
      circle(d=2.5,$fn=40);

    if(single){
      translate([-3,-3.25])
        circle(d=2.5,$fn=40);
      translate([4.25,-3])
        circle(d=2.5,$fn=40);
    } else {
      translate([-3,-3.25])
        square([7.8,0.8]);
    }

    translate([7,-2.5])
      circle(d=2.5,$fn=40);
    translate([4.25,0]) {
      circle(d=2.5,$fn=40);
      rotate(-45)
        square([5,0.8]);
    }

    translate([4,-6])
      square([0.8,3]);
    if(connections[2] != "none")
      translate([4,-6])
        square([4.5,0.8]);

    if(connections[3] == "hole"){
      translate([-5.5,2.5])
        circle(d=2.25, $fn=20);
      translate([-5.5,0])
        circle(d=2.25, $fn=20);
      translate([-5.5,-2.5])
        circle(d=2.25, $fn=20);
    }
    translate([-7.5,-2.5])
      circle(d=2.25, $fn=20);
    translate([-7.5,2.5])
      circle(d=2.25, $fn=20);
    translate([-7.5,0])
      circle(d=2.25, $fn=20);
  }
}

module ec11_pcb_traces_bottom(connections=["hole","hole","hole","hole"]) {
  switch_base_pcb_traces_bottom(rgb=false, connections=connections) {
    // Key Row
    translate([2,2.2])
      square([4.5,0.8]);
    r_len = connections[0] != "none" ? u_mm(0.5)-1 : 6;
    l_len = connections[1] != "none" ? u_mm(0.5)-1 : 6;
    translate([2,-r_len])
      square([0.8,r_len+l_len]);
    
    if(connections[0] != "none")
      translate([-1.3,1-u_mm(0.5)])
        square([4,0.8]);
    if(connections[1] != "none")
      translate([-1,u_mm(0.5)-1.4])
        square([3.8,0.8]);
    translate([7,2.5])
      circle(d=2.5,$fn=40);

    // Key Column
    translate([-3,0])
      circle(d=2.5,$fn=40);

    translate([7,-2.5])
      circle(d=2.5,$fn=40);
    translate([4.25,0]) {
      circle(d=2.5,$fn=40);
    }

    if(connections[3] == "hole"){
      translate([-5.5,2.5])
        circle(d=2.25, $fn=20);
      translate([-5.5,0])
        circle(d=2.25, $fn=20);
      translate([-5.5,-2.5])
        circle(d=2.25, $fn=20);
    }
    translate([-7.5,-2.5])
      circle(d=2.25, $fn=20);
    translate([-7.5,2.5])
      circle(d=2.25, $fn=20);
    translate([-7.5,0])
      circle(d=2.25, $fn=20);
  }
}

module ec11_pcb_outline() {
  square([u_mm(1), u_mm(1)]);
}

module ec11_space_outline() {
  translate([-0.5,-0.5, -6])
    cube([u_mm(1)+1, u_mm(1)+1, 8]);
  1u_centered() {
    translate([0,0,-15])
      linear_extrude(15)
        circle(d=7, $fn=30);
    translate([0,0,-25])
      linear_extrude(15)
        circle(d=19, $fn=80);
  }
}
// file: ../../lib/switches/choc_v1.scad
include <../variables.scad>
include <stabilizers.scad>
include <footprints.scad>

module switch_choc_v1_pcb_drill(width=1, height=1) {
  half_width = u_mm(width)/2;
  half_height = u_mm(height)/2;
  translate([half_width,half_height,0]) {
    circle(d=3.5, $fn=30);

    translate([-5.5,0])
      circle(d=2, $fn=30);
    translate([3,3.8])
      circle(d=1, $fn=30);
    translate([-4, 3.8])
      circle(d=1, $fn=30);
    translate([-4,1.25-half_height])
      circle(d=1, $fn=30);
    translate([-4, half_height-3])
      circle(d=1, $fn=30);

    translate([5.5,0])
      circle(d=2, $fn=30);
    translate([0,5.9])
      circle(d=1.3, $fn=30);
    translate([5,3.8])
      circle(d=1.3, $fn=30);
    translate([1-half_width, half_height-1])
      circle(d=1, $fn=30);
    translate([half_width-1, half_height-1])
      circle(d=1, $fn=30);
  }
}

module switch_choc_v1_pcb_traces(width=1, height=1) {
  half_width = u_mm(width)/2;
  half_height = u_mm(height)/2;
  translate([half_width,half_height,0]) {
    translate([5,3.8])
      circle(d=2.8, $fn=30);
    translate([3,3.8])
      circle(d=2.5, $fn=30);
    translate([-4, 3.8])
      circle(d=2.5, $fn=30);
    translate([-4.5, 2-half_height])
      square([1, u_mm(height)-4]);
    translate([-4,1.25-half_height])
      circle(d=2.5, $fn=30);
    translate([-4, half_height-3])
      circle(d=2.5, $fn=30);

    translate([0,5.9])
      circle(d=2.8, $fn=30);
    translate([-0.5, 5.9])
      square([1, half_height-6.9]);
    translate([1-half_width, half_height-1.5])
      square([half_width*2-2, 1]);
    translate([1-half_width, half_height-1])
      circle(d=2.5, $fn=30);
    translate([half_width-1, half_height-1])
      circle(d=2.5, $fn=30);
  }
}

module switch_choc_v1_pcb_outline(width=1, height=1) {
  pcb_switch_outline(width=width, height=height);
}
// file: ../../lib/switches/mx.scad
include <../variables.scad>
include <stabilizers.scad>
include <footprints.scad>
include <base.scad>
include <rgb.scad>

module switch_mx_pcb_drill(width=1, height=1, rgb=true, single=true, connections=["hole","hole","hole","hole"]) {
  half_width = u_mm(width)/2;
  half_height = u_mm(height)/2;
  translate([hole_offset(width), half_height]) {
    stab_holes(width);
  }

  switch_base_pcb_drill(width=width, height=height, single=single, rgb=rgb, connections=connections) {
    circle(d=4,$fn=40);
    translate([-3.8,-2.5,0])
      circle(d=1.7,$fn=40);
    translate([2.5,-5,0])
      circle(d=1.7,$fn=40);
    translate([5,0,0])
      circle(d=1.75,$fn=40);
    translate([-5,0,0])
      circle(d=1.75,$fn=40);

    // Column
    translate([-1.2,-3,0])
      circle(d=1,$fn=40);
    translate([5,-2,0])
      circle(d=1,$fn=40);
    if(single){
      translate([6,-3.7,0])
        circle(d=1,$fn=40);
      if(rgb) {
        translate([5,1.7,0])
          circle(d=1,$fn=40);
      } else {
        translate([6,-8.3,0])
          circle(d=1,$fn=40);
      }
    }
  }
}

module switch_mx_pcb_traces(width=1, height=1, rgb=true, single=true, xpos=0, ypos=0, connections=["hole","hole","hole","hole"], last_xpos=0, last_ypos=0) {
  half_width = u_mm(width)/2;
  half_height = u_mm(height)/2;
  switch_base_pcb_traces(width=width, height=height, rgb=rgb, xpos=xpos, ypos=ypos, connections=connections, last_xpos=last_xpos, last_ypos=last_ypos, single=single) {
    translate([-3.8,-2.5,0])
      circle(d=4,$fn=40);
    translate([2.5,-5,0])
      circle(d=4,$fn=40);

    // Row
    v_left = connections[3] == "none" ? 1 : half_width;
    v_right = connections[2] == "none" ? 1 : half_width-5;
    translate([1-v_left,-5.9,0])
      square([v_left+v_right+3,0.8]);

    // Column
    translate([-1.2,-3,0])
      circle(d=2.5,$fn=40);
    translate([5,-2,0])
      circle(d=2.5,$fn=40);
    if(single){
      translate([6,-3.7,0])
        circle(d=2.5,$fn=40);
      difference() {
        translate([5,0,0])
          circle(d=3.55,$fn=40);
        translate([5,-2,0])
          square(4);
      }
      if(rgb) {
        translate([5,1.7,0])
          circle(d=2.3,$fn=40);
      } else {
        translate([4.2,1])
          square([0.8, half_height-2]);
        translate([-1,half_height-1.5])
          square([6,0.8]);
        translate([6,-8.3,0])
          circle(d=2.5,$fn=40);
        translate([-1.3,-8.7,0])
          square([7,0.8]);
      }
    }
  }
}

module switch_mx_pcb_traces_bottom(width=1, height=1, rgb=true, xpos=0, ypos=0, connections=["hole","hole","hole","hole"], last_xpos=0, last_ypos=0) {
  half_width = u_mm(width)/2;
  half_height = u_mm(height)/2;
  switch_base_pcb_traces_bottom(width=width, height=height, rgb=rgb, xpos=xpos, ypos=ypos, connections=connections, last_xpos=last_xpos, last_ypos=last_ypos) {
    translate([-3.8,-2.5,0])
      circle(d=4,$fn=40);
    translate([2.5,-5,0])
      circle(d=4,$fn=40);

    // Column
    translate([-1.2,-3,0])
      circle(d=2.5,$fn=40);
    translate([5,-2,0])
      circle(d=2.5,$fn=40);
    difference(){
      translate([2.5,-5,0])
        circle(d=5.9,$fn=40);
      translate([2.5,-5,0])
        circle(d=4.1,$fn=40);
      translate([0.3,-7,0])
        rotate(45)
          square(6);
    }
    translate([3.85,-3.45])
      square([0.8, 1]);

    t_height = connections[0] == "none" ? 1 : half_height-7.8;
    echo("h", 2-half_height, t_height);
    translate([-1.3,-t_height-6.8])
      square([0.8, t_height]);
    translate([-1.3,-7.2])
      square([2.2,0.8]);
    difference() {
      translate([5,0,0])
        circle(d=3.35,$fn=40);
      translate([5,-2,0])
        square(4);
    }
    b_height = connections[1] == "none" ? 2 : half_height-2;
    translate([4.2,1])
      square([0.8, b_height]);
    if(connections[1] != "none")
      translate([-1,half_height-1.5])
        square([6,0.8]);
  }
}

module switch_mx_pcb_outline(width=1, height=1) {
  pcb_switch_outline(width=width, height=height);
}
// file: ../../lib/utilities.scad
function reverse(list) = len(list) > 0 ? [for (i = [1:len(list)]) list[len(list)-i]] : [];
function pop(list) = len(list) > 0 ? [for (i = [0:len(list)-1]) if (i != 0) list[i]] : [];
// file: ../../lib/switches.scad
use <utilities.scad>
include <switches/mx.scad>
include <switches/choc_v1.scad>

module rotate_translate(rotation, xpos, ypos) {
  if(rotation[0] == undef || rotation[0] == 0) {
    translate([u_mm(xpos), u_mm(ypos), 0]) {
      children();
    }
  } else {
    xoff = rotation[1] == undef ? 0 : rotation[1];
    yoff = rotation[2] == undef ? 0 : rotation[2];
    angle = rotation[0] == undef ? 0 : rotation[0];
    translate([u_mm(xpos - xoff), u_mm(ypos - yoff), 0])
      rotate(angle)
        translate([u_mm(xoff), u_mm(yoff), 0])
          children();
  }
}

module switch(type, style="mx", rgb=true, xpos=0, ypos=0, width=1, cnc=false, rotation=[0,0,0], connections=["hole","hole","hole","hole"], last_xpos=0, last_ypos=0) {
  rotate_translate(rotation, xpos, ypos) {
    if(type == "outline")
      pcb_switch_outline(width=width);
    if(style == "mx") {
      if(type == "key")
        pcb_switch_space_outline(width=width, cnc=cnc, style="mx");
      if(type == "traces")
        switch_mx_pcb_traces(width=width, rgb=rgb, xpos=xpos, ypos=ypos, connections=connections, last_xpos=last_xpos, last_ypos=last_ypos);
      if(type == "traces_top")
        switch_mx_pcb_traces(width=width, single=false, rgb=rgb, xpos=xpos, ypos=ypos, connections=connections, last_xpos=last_xpos, last_ypos=last_ypos);
      if(type == "traces_bottom")
        switch_mx_pcb_traces_bottom(width=width, rgb=rgb, xpos=xpos, ypos=ypos, connections=connections, last_xpos=last_xpos, last_ypos=last_ypos);
      if(type == "drill")
        switch_mx_pcb_drill(width=width, rgb=rgb, connections=connections);
      if(type == "drill_double")
        switch_mx_pcb_drill(width=width, single=false, rgb=rgb, connections=connections);
    }

    if(style == "choc_v1") {
      if(type == "key")
        pcb_switch_space_outline(width=width, cnc=cnc, style="choc_v1");
      if(type == "traces")
        switch_choc_v1_pcb_traces(width=width);
      if(type == "traces_top")
        switch_choc_v1_pcb_traces(width=width);
      if(type == "traces_bottom")
        assert(false, "traces_bottom is incompatible with choc_v1");
      if(type == "drill")
        switch_choc_v1_pcb_drill(width=width);
      if(type == "drill_double")
        switch_choc_v1_pcb_drill(width=width, single=false);
    }

    if(style == "redragon") {
      if(type == "key")
        pcb_switch_space_outline(width=width, cnc=cnc, style="redragon");
      if(type == "traces")
        switch_mx_pcb_traces(width=width, rgb=rgb);
      if(type == "traces_top")
        switch_mx_pcb_traces(width=width, single=false, rgb=rgb);
      if(type == "traces_bottom")
        switch_mx_pcb_traces_bottom(width=width, rgb=rgb);
      if(type == "traces")
        switch_mx_pcb_traces(width=width, rgb=rgb);
      if(type == "drill")
        switch_mx_pcb_drill(width=width);
      if(type == "drill_double")
        switch_mx_pcb_drill(width=width, single=false);
    }
  }
}

module switch_row(keys, style="mx", rgb=true, margin=5, thickness=10, depth=0, cnc=false, type="key", last_row=[], last_xpos=0, previous_xpos=0, last_ypos=0, previous_ypos=0) {
  width = keys[0][0] == undef ? 1 : keys[0][0];
  xpos = keys[0][1] == undef ? 0 : keys[0][1];
  ypos = keys[0][2] == undef ? 0 : keys[0][2];
  rotation = keys[0][3] == undef ? [0,0,0] : keys[0][3];
  connections = keys[0][4] == undef ? ["hole","hole","hole","hole"] : keys[0][4];
  last_ypos = last_row[0][2] == undef ? last_ypos - previous_ypos : last_row[0][2]+last_ypos - previous_ypos;
  last_xpos = last_row[0][1] == undef ? last_xpos - previous_xpos : last_row[0][1]+last_xpos - previous_xpos;
  switch(type, style=style, rgb=rgb, xpos=xpos, ypos=ypos, width=width, cnc=cnc, rotation=rotation, connections=connections, last_xpos=last_xpos, last_ypos=last_ypos);
  if(len(keys) > 1) {
    translate([xpos*key_size+width*key_size, ypos*key_size, 0])
      switch_row(pop(keys), style=style, rgb=rgb, margin=margin, thickness=thickness, depth=depth, cnc=cnc, type=type, last_row = pop(last_row), last_xpos=last_xpos, previous_xpos=xpos, last_ypos=last_ypos, previous_ypos=ypos);
  }
}

module switches(switches, style="mx", rgb=true, margin=5, thickness=10, depth=0, cnc=false, type="key", last_row=[]) {
  if(len(switches) != 0) {
    switch_row(switches[0], style=style, rgb=rgb, margin=margin, thickness=thickness, depth=depth, cnc=cnc, type=type, last_row=last_row);
    if(len(switches) > 1) {
      last_row = switches[0];
      translate([0, key_size, 0])
        switches(pop(switches), style=style, rgb=rgb, margin=margin, depth=depth, thickness=thickness, cnc=cnc, type=type, last_row=last_row);
    }
  }
}
// file: ../../lib/case.scad
include <variables.scad>
use <utilities.scad>
use <circuits.scad>

function key_width(key) = (key[0] == undef ? 1 : key[0]) + (key[1] == undef ? 0 : key[1]);
function width_row(row) = len(row) == 0 ? 0 : key_width(row[0]) + width_row(pop(row));
function width_board(rows) = len(rows) == 0 ? 0 : (
  let (current = width_row(rows[0]))
  let (next = width_board(pop(rows)))
    current > next ? current : next);

function key_height(key) = (key[2] == undef ? 0 : key[2]);
function height_row(row) = len(row) == 0 ? [0,0] : (
  let(other_rows = height_row(pop(row)))
  let(current = key_height(row[0]) + other_rows[0])
  let(maximum = current > other_rows[1] ? current : other_rows[1])
  [current, maximum]);
function height_board_rec(rows) = len(rows) == 0 ? 0 : (
  let (current = height_row(reverse(rows[0]))[1])
  let (next = height_board_rec(pop(rows)))
    current > next ? current : next);
function height_board(rows) = 
  let (height_rec = height_board_rec(rows))
    len(rows) + (height_rec > 0 ? height_rec : 0);

module case(rows, style="mx", margin=5, thickness=5, depth=0, radius=2, rest=0, circuits=[], _inherit_children="unset") {
  total_thickness = thickness + depth + height_for_style(style);
  z_offset = depth + height_for_style(style);
  if($children != 0 && (_inherit_children == "unset" || _inherit_children > 0)) {
    translate([0, 0, -z_offset])
      linear_extrude(total_thickness)
        offset(margin)
          children();
  } else {
    width=u_mm(width_board(rows))+margin*2;
    height=u_mm(height_board(rows))+margin*2+rest;
    translate([-margin, -margin, -z_offset]){
      translate([radius, 0, 0])
        cube([width-radius*2, height,total_thickness]);
      translate([0, radius, 0])
        cube([width, height-radius*2,total_thickness]);
      translate([radius, radius, 0])
        cylinder(total_thickness,radius,radius, $fn=60);
      translate([width-radius, radius, 0])
        cylinder(total_thickness,radius,radius, $fn=60);
      translate([width-radius, height-radius, 0])
        cylinder(total_thickness,radius,radius, $fn=60);
      translate([radius, height-radius, 0])
        cylinder(total_thickness,radius,radius, $fn=60);
    }
    if(len(circuits) > 0)
      translate([0, 0, -z_offset])
        linear_extrude(total_thickness)
          offset(margin)
            circuits_pcb_outline(circuits);
  }
}
// file: ../../lib/variables.scad
key_size=19.05;
hole=14;

function u_mm(u) = u*key_size;
function hole_offset(u) = (key_size-hole)/2+u_mm(u-1)/2;

// This is used to determine how much space is between the top
// of the plate and the PCB.
function height_for_style(style) = style == "mx"        ? 5.334 :
                                   style == "redragon" ? 3.75  :
                                   style == "choc_v1"   ? 2.2   :  "invalid style";
// main file
use <../../keyboard.scad>

layout = [
  [[],[]],
  [[],[]]
];
bottom_case(layout)
  translate([u_mm(1),u_mm(1),0])
    circle(d=u_mm(3));
